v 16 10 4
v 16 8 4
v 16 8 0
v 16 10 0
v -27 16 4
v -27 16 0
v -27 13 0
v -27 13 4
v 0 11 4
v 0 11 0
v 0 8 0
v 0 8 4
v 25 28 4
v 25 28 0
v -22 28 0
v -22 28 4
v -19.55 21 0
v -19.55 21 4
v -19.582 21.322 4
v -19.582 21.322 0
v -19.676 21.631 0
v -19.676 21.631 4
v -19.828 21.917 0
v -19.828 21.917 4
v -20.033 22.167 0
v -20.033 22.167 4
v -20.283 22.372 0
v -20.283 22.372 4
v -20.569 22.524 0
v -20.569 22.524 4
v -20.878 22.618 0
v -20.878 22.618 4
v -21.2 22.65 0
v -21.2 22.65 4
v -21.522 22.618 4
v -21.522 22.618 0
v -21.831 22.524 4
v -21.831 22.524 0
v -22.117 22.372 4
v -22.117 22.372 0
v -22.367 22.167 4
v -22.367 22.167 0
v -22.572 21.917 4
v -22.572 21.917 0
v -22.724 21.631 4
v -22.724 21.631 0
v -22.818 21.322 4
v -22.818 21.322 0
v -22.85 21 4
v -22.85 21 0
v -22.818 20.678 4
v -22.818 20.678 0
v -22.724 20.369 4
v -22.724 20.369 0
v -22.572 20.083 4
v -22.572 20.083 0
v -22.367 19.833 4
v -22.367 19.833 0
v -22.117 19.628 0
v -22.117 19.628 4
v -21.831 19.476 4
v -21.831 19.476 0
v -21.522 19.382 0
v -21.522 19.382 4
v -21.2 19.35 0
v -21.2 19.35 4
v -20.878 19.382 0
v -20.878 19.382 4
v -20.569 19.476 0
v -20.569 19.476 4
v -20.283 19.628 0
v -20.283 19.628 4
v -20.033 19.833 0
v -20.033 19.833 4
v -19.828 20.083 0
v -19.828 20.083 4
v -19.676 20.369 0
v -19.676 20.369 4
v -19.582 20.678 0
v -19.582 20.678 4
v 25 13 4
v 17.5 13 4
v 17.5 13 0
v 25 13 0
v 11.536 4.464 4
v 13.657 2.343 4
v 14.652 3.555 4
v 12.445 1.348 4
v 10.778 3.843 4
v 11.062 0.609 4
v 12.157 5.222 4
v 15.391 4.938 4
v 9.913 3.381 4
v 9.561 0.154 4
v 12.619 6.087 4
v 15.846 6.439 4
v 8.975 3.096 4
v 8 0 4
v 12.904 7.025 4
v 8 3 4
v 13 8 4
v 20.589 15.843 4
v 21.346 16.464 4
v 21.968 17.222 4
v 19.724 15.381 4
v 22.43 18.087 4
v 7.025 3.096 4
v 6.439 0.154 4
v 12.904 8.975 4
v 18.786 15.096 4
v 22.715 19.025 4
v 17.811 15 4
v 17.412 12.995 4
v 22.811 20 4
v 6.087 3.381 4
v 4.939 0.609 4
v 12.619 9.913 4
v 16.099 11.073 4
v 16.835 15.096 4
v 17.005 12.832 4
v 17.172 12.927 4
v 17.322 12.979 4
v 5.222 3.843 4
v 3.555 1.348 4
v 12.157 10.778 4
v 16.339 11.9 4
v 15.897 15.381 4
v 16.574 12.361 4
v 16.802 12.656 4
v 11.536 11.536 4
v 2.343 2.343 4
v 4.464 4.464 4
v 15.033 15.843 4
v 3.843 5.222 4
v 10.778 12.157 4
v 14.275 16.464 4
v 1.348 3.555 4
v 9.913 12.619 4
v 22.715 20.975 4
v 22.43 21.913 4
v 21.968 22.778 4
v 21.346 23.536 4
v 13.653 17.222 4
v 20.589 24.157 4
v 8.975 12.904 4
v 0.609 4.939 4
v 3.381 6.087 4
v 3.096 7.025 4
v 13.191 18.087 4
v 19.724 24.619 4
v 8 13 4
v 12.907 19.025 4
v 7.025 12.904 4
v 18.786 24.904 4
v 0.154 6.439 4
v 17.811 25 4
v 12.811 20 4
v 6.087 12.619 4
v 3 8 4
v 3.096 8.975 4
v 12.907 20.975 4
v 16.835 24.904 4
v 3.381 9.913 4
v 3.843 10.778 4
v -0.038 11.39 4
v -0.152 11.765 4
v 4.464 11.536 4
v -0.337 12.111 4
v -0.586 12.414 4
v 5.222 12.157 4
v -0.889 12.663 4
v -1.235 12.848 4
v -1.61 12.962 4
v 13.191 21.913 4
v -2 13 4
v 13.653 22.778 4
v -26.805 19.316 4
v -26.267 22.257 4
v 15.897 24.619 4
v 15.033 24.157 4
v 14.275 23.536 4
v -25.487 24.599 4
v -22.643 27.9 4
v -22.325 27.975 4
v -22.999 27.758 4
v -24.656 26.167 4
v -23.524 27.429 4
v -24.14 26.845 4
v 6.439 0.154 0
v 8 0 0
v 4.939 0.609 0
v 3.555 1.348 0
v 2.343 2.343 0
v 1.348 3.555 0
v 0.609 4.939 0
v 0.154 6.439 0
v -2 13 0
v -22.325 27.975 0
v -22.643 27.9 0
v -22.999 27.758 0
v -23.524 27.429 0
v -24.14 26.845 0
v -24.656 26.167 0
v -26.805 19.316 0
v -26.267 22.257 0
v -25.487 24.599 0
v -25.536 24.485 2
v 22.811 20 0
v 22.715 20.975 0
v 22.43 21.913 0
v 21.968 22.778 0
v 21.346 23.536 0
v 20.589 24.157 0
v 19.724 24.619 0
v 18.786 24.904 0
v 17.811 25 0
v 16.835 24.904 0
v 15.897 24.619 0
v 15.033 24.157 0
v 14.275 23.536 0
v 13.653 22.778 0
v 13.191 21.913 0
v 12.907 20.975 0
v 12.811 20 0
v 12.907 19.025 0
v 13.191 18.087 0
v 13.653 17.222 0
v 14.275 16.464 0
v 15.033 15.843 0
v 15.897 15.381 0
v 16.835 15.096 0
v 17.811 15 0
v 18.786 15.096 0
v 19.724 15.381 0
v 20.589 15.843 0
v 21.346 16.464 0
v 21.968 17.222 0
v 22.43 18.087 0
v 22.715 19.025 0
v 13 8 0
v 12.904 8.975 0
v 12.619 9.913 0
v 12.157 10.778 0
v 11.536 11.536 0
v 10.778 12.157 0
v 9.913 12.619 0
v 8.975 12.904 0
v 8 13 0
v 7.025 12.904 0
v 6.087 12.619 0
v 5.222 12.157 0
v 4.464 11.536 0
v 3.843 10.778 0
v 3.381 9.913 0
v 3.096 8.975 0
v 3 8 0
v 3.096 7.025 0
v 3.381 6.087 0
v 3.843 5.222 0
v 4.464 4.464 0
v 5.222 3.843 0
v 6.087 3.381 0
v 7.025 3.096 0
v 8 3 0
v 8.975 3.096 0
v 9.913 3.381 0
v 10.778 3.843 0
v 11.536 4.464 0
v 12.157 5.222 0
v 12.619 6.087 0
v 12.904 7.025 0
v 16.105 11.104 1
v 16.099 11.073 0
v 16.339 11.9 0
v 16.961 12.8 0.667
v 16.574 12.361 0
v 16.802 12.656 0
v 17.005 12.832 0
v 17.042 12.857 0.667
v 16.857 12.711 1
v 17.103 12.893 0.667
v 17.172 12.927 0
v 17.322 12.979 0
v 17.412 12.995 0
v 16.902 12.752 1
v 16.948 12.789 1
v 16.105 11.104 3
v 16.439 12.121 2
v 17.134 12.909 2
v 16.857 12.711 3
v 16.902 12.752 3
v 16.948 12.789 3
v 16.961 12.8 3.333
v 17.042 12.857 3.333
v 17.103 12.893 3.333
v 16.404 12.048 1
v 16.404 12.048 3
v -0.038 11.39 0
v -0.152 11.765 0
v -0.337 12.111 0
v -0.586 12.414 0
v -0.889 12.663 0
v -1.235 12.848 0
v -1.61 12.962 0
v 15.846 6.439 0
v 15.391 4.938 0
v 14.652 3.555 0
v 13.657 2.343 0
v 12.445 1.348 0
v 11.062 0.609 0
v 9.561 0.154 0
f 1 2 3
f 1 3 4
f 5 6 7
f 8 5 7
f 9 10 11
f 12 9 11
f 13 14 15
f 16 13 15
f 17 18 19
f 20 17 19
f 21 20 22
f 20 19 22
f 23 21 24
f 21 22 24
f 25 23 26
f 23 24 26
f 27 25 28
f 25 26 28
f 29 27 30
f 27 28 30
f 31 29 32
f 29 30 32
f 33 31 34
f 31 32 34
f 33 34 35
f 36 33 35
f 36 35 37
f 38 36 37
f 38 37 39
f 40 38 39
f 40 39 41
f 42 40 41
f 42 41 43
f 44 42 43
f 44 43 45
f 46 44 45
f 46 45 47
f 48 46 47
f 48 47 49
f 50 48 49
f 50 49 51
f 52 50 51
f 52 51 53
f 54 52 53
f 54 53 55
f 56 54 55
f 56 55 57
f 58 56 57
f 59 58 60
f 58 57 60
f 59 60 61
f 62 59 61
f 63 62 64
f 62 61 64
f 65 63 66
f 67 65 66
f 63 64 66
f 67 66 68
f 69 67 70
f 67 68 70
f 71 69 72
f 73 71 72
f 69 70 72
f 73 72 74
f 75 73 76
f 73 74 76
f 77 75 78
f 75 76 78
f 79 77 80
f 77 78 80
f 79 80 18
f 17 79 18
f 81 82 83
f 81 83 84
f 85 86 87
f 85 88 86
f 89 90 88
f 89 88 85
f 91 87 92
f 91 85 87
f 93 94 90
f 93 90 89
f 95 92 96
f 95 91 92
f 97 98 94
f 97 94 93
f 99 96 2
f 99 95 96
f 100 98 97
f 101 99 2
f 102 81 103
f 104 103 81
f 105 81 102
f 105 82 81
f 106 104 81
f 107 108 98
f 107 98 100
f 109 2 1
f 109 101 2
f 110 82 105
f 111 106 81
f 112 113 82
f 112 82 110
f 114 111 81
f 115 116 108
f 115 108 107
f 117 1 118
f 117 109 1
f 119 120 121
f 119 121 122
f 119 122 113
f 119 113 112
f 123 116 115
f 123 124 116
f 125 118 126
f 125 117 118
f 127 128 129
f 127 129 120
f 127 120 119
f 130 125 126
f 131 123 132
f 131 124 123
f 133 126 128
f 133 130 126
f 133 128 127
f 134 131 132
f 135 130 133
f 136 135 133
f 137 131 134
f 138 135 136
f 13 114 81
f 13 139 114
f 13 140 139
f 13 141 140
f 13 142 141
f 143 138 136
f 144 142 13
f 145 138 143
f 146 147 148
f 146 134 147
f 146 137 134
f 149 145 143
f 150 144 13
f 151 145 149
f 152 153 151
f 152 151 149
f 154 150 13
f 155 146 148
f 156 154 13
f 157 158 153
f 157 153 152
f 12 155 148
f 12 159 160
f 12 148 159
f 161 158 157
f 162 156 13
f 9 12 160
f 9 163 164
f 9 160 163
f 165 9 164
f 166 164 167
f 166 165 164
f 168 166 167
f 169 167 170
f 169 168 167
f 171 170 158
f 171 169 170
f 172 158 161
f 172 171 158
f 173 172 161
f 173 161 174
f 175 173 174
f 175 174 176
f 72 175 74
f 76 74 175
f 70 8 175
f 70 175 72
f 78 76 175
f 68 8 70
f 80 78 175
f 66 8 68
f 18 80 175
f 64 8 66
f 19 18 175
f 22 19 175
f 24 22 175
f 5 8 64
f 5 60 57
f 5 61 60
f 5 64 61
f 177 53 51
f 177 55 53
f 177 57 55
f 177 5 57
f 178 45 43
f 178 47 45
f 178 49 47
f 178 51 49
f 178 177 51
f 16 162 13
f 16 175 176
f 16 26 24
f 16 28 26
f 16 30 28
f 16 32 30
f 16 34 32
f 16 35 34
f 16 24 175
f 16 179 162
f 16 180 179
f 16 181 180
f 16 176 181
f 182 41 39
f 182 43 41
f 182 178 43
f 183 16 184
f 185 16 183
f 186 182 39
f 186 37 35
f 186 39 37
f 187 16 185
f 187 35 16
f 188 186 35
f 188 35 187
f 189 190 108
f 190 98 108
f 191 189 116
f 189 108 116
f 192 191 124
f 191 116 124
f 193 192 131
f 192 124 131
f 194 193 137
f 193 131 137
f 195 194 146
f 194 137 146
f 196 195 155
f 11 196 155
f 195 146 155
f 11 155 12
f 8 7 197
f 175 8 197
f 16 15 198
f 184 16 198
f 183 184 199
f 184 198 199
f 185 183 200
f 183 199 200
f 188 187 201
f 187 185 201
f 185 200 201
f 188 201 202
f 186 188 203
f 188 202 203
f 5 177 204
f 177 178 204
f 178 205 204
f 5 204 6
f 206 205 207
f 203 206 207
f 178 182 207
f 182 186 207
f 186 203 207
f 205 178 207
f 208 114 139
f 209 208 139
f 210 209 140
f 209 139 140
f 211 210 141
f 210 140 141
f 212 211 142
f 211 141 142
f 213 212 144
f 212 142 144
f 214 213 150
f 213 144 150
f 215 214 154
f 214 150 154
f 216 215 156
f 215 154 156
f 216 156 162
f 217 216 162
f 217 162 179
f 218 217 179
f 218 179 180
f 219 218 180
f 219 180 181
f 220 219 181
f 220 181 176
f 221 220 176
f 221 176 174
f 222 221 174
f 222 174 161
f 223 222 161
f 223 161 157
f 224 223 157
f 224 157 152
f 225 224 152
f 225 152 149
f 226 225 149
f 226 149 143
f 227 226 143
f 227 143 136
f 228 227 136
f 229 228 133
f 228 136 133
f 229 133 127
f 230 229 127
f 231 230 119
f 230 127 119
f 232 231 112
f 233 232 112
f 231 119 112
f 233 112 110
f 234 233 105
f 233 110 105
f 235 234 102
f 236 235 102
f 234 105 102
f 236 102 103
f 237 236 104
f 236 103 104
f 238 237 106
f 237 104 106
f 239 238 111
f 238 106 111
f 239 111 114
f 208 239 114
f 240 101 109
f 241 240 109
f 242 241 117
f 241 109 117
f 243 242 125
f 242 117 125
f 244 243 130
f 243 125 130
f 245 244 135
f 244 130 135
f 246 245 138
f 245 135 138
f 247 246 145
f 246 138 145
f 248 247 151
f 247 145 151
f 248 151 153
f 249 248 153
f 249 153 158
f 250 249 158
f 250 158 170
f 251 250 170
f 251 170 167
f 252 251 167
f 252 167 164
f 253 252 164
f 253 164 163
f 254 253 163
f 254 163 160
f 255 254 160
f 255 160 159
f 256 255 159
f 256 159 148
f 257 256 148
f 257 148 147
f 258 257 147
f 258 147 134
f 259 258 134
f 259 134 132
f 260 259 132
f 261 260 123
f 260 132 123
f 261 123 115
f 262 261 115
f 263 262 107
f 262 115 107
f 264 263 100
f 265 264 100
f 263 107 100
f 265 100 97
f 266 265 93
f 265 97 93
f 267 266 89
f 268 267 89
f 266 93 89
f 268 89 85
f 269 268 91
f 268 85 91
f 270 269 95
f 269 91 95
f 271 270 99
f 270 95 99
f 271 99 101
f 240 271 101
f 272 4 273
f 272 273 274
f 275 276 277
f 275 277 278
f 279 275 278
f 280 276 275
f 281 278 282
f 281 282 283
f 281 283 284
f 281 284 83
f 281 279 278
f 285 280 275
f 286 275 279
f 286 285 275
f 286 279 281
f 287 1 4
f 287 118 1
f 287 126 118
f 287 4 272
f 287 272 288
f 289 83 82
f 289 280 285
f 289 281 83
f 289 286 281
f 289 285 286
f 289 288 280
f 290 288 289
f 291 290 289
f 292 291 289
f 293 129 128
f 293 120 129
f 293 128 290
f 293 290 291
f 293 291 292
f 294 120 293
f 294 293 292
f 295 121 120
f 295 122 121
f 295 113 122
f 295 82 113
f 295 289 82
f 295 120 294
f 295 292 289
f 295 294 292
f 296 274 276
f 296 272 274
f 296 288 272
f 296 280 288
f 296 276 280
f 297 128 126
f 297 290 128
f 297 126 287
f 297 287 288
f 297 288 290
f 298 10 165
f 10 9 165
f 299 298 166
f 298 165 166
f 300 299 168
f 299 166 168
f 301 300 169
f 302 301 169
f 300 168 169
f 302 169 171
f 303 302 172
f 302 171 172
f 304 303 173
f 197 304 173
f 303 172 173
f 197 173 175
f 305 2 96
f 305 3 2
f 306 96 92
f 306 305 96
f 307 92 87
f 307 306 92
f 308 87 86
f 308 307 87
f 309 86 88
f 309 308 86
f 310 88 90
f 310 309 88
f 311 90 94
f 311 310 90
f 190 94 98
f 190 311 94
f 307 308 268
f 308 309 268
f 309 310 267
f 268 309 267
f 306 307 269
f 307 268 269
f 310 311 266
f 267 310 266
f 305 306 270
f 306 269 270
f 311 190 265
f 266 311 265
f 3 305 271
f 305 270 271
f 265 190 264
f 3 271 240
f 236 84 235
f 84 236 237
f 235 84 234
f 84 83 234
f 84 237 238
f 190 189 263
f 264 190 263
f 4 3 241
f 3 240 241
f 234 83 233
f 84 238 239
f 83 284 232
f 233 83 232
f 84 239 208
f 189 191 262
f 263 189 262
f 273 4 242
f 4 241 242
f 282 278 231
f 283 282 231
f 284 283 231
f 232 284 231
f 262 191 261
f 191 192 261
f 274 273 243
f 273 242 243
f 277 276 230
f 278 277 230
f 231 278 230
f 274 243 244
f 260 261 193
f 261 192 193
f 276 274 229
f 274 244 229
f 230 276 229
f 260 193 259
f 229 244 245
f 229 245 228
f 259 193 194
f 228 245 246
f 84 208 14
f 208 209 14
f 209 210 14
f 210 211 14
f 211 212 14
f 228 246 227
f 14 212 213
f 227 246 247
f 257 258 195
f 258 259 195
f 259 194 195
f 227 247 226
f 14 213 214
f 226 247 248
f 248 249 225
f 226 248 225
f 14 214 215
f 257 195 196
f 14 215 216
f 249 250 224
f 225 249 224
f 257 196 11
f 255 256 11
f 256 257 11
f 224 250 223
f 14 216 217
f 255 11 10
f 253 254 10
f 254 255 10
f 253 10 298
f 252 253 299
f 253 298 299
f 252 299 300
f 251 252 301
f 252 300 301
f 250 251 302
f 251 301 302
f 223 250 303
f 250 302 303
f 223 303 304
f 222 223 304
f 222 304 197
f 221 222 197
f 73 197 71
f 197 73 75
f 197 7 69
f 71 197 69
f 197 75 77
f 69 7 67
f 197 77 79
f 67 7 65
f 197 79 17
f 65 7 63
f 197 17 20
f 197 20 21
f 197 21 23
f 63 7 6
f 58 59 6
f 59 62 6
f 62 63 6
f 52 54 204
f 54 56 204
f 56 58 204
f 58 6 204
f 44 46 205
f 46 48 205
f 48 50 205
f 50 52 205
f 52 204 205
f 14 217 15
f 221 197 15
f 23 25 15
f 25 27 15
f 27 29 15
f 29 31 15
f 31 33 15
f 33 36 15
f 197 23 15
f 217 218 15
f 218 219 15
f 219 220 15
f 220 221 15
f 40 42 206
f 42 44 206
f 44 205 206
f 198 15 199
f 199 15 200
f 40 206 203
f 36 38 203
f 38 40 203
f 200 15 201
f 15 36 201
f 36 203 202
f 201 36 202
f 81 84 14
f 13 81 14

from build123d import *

# Parameters (mm, degrees)
RESSALTO_EXTRUS_O1_DEPTH = 4
FILETE3_R                = 8
ESBO_O2_R                = 1.65
ESBO_O2_R_2              = 5
CORTE_EXTRUS_O1_DEPTH    = 40.102429592
FILETE12_SIZE            = 5
FILETE12_SIZE_2          = 12
FILETE14_R               = 2
ESBO_O3_W                = 9
ESBO_O3_H                = 13
CORTE_EXTRUS_O2_DEPTH    = 40.102429743
FILETE15_R               = 8
FILETE16_SIZE            = 3
FILETE16_SIZE_2          = 1.5


# Some blends are built 0.0001 mm under size
with BuildPart() as part:
    # Esboço1 → Ressalto-extrusão1 (new body)
    with BuildSketch(Plane.XY):
        Polygon((0, 0), (25, 0), (25, 28), (-27, 28), (-27, 13), (0, 13), align=None)
    extrude(amount=RESSALTO_EXTRUS_O1_DEPTH)

    # Filete3
    filete3_edges = [part.edges().sort_by_distance(p)[0] for p in [
        (0, 0, 2),
    ]]
    fillet(filete3_edges, radius=FILETE3_R)

    # Esboço2 → Corte-extrusão1 (cut, through all)
    with BuildSketch(Plane.XY.offset(4)):
        with Locations((-21.2, 21)):
            Circle(ESBO_O2_R)
        with Locations((8, 8)):
            Circle(ESBO_O2_R_2)
        with Locations((17.810708435, 20)):
            Circle(ESBO_O2_R_2)
    extrude(amount=-CORTE_EXTRUS_O1_DEPTH, mode=Mode.SUBTRACT)

    # Filete12
    # an asymmetric fillet: 12, 5 mm, written as the material it takes off along each edge
    with BuildSketch(Plane(origin=(-27, 28, -30), x_dir=(1, 0, 0), z_dir=(0, 0, 1))) as filete12_piece_1:
        with BuildLine():
            Bezier((FILETE12_SIZE, 0), (0, 0), (0, -FILETE12_SIZE_2), weights=[1, 0.707106781, 1])
            Line((0, -FILETE12_SIZE_2), (0, 0))
            Line((0, 0), (FILETE12_SIZE, 0))
        make_face()
    extrude(amount=64, mode=Mode.SUBTRACT)

    # Filete14
    filete14_edges = [part.edges().sort_by_distance(p)[0] for p in [
        (0, 13, 2),
    ]]
    fillet(filete14_edges, radius=FILETE14_R)

    # Esboço3 → Corte-extrusão2 (cut, through all)
    with BuildSketch(Plane.XY.offset(4)):
        with Locations((20.5, 6.5)):
            Rectangle(ESBO_O3_W, ESBO_O3_H)
    extrude(amount=-CORTE_EXTRUS_O2_DEPTH, mode=Mode.SUBTRACT)

    # Filete15
    filete15_edges = [part.edges().sort_by_distance(p)[0] for p in [
        (16, 0, 2),
    ]]
    fillet(filete15_edges, radius=FILETE15_R - 0.0001)  # a hair under: the kernel refuses the full size

    # Filete16
    # an asymmetric fillet: 3, 1.5 mm, written as the material it adds along each edge
    with BuildSketch(Plane(origin=(16, 13, 4), x_dir=(0, -1, 0), z_dir=(0, 0, -1))) as filete16_piece_1:
        with BuildLine():
            Bezier((FILETE16_SIZE, 0), (0, 0), (0, -FILETE16_SIZE_2), weights=[1, 0.707106781, 1])
            Line((0, -FILETE16_SIZE_2), (0, 0))
            Line((0, 0), (FILETE16_SIZE, 0))
        make_face()
    extrude(amount=4)


solid = part.part
